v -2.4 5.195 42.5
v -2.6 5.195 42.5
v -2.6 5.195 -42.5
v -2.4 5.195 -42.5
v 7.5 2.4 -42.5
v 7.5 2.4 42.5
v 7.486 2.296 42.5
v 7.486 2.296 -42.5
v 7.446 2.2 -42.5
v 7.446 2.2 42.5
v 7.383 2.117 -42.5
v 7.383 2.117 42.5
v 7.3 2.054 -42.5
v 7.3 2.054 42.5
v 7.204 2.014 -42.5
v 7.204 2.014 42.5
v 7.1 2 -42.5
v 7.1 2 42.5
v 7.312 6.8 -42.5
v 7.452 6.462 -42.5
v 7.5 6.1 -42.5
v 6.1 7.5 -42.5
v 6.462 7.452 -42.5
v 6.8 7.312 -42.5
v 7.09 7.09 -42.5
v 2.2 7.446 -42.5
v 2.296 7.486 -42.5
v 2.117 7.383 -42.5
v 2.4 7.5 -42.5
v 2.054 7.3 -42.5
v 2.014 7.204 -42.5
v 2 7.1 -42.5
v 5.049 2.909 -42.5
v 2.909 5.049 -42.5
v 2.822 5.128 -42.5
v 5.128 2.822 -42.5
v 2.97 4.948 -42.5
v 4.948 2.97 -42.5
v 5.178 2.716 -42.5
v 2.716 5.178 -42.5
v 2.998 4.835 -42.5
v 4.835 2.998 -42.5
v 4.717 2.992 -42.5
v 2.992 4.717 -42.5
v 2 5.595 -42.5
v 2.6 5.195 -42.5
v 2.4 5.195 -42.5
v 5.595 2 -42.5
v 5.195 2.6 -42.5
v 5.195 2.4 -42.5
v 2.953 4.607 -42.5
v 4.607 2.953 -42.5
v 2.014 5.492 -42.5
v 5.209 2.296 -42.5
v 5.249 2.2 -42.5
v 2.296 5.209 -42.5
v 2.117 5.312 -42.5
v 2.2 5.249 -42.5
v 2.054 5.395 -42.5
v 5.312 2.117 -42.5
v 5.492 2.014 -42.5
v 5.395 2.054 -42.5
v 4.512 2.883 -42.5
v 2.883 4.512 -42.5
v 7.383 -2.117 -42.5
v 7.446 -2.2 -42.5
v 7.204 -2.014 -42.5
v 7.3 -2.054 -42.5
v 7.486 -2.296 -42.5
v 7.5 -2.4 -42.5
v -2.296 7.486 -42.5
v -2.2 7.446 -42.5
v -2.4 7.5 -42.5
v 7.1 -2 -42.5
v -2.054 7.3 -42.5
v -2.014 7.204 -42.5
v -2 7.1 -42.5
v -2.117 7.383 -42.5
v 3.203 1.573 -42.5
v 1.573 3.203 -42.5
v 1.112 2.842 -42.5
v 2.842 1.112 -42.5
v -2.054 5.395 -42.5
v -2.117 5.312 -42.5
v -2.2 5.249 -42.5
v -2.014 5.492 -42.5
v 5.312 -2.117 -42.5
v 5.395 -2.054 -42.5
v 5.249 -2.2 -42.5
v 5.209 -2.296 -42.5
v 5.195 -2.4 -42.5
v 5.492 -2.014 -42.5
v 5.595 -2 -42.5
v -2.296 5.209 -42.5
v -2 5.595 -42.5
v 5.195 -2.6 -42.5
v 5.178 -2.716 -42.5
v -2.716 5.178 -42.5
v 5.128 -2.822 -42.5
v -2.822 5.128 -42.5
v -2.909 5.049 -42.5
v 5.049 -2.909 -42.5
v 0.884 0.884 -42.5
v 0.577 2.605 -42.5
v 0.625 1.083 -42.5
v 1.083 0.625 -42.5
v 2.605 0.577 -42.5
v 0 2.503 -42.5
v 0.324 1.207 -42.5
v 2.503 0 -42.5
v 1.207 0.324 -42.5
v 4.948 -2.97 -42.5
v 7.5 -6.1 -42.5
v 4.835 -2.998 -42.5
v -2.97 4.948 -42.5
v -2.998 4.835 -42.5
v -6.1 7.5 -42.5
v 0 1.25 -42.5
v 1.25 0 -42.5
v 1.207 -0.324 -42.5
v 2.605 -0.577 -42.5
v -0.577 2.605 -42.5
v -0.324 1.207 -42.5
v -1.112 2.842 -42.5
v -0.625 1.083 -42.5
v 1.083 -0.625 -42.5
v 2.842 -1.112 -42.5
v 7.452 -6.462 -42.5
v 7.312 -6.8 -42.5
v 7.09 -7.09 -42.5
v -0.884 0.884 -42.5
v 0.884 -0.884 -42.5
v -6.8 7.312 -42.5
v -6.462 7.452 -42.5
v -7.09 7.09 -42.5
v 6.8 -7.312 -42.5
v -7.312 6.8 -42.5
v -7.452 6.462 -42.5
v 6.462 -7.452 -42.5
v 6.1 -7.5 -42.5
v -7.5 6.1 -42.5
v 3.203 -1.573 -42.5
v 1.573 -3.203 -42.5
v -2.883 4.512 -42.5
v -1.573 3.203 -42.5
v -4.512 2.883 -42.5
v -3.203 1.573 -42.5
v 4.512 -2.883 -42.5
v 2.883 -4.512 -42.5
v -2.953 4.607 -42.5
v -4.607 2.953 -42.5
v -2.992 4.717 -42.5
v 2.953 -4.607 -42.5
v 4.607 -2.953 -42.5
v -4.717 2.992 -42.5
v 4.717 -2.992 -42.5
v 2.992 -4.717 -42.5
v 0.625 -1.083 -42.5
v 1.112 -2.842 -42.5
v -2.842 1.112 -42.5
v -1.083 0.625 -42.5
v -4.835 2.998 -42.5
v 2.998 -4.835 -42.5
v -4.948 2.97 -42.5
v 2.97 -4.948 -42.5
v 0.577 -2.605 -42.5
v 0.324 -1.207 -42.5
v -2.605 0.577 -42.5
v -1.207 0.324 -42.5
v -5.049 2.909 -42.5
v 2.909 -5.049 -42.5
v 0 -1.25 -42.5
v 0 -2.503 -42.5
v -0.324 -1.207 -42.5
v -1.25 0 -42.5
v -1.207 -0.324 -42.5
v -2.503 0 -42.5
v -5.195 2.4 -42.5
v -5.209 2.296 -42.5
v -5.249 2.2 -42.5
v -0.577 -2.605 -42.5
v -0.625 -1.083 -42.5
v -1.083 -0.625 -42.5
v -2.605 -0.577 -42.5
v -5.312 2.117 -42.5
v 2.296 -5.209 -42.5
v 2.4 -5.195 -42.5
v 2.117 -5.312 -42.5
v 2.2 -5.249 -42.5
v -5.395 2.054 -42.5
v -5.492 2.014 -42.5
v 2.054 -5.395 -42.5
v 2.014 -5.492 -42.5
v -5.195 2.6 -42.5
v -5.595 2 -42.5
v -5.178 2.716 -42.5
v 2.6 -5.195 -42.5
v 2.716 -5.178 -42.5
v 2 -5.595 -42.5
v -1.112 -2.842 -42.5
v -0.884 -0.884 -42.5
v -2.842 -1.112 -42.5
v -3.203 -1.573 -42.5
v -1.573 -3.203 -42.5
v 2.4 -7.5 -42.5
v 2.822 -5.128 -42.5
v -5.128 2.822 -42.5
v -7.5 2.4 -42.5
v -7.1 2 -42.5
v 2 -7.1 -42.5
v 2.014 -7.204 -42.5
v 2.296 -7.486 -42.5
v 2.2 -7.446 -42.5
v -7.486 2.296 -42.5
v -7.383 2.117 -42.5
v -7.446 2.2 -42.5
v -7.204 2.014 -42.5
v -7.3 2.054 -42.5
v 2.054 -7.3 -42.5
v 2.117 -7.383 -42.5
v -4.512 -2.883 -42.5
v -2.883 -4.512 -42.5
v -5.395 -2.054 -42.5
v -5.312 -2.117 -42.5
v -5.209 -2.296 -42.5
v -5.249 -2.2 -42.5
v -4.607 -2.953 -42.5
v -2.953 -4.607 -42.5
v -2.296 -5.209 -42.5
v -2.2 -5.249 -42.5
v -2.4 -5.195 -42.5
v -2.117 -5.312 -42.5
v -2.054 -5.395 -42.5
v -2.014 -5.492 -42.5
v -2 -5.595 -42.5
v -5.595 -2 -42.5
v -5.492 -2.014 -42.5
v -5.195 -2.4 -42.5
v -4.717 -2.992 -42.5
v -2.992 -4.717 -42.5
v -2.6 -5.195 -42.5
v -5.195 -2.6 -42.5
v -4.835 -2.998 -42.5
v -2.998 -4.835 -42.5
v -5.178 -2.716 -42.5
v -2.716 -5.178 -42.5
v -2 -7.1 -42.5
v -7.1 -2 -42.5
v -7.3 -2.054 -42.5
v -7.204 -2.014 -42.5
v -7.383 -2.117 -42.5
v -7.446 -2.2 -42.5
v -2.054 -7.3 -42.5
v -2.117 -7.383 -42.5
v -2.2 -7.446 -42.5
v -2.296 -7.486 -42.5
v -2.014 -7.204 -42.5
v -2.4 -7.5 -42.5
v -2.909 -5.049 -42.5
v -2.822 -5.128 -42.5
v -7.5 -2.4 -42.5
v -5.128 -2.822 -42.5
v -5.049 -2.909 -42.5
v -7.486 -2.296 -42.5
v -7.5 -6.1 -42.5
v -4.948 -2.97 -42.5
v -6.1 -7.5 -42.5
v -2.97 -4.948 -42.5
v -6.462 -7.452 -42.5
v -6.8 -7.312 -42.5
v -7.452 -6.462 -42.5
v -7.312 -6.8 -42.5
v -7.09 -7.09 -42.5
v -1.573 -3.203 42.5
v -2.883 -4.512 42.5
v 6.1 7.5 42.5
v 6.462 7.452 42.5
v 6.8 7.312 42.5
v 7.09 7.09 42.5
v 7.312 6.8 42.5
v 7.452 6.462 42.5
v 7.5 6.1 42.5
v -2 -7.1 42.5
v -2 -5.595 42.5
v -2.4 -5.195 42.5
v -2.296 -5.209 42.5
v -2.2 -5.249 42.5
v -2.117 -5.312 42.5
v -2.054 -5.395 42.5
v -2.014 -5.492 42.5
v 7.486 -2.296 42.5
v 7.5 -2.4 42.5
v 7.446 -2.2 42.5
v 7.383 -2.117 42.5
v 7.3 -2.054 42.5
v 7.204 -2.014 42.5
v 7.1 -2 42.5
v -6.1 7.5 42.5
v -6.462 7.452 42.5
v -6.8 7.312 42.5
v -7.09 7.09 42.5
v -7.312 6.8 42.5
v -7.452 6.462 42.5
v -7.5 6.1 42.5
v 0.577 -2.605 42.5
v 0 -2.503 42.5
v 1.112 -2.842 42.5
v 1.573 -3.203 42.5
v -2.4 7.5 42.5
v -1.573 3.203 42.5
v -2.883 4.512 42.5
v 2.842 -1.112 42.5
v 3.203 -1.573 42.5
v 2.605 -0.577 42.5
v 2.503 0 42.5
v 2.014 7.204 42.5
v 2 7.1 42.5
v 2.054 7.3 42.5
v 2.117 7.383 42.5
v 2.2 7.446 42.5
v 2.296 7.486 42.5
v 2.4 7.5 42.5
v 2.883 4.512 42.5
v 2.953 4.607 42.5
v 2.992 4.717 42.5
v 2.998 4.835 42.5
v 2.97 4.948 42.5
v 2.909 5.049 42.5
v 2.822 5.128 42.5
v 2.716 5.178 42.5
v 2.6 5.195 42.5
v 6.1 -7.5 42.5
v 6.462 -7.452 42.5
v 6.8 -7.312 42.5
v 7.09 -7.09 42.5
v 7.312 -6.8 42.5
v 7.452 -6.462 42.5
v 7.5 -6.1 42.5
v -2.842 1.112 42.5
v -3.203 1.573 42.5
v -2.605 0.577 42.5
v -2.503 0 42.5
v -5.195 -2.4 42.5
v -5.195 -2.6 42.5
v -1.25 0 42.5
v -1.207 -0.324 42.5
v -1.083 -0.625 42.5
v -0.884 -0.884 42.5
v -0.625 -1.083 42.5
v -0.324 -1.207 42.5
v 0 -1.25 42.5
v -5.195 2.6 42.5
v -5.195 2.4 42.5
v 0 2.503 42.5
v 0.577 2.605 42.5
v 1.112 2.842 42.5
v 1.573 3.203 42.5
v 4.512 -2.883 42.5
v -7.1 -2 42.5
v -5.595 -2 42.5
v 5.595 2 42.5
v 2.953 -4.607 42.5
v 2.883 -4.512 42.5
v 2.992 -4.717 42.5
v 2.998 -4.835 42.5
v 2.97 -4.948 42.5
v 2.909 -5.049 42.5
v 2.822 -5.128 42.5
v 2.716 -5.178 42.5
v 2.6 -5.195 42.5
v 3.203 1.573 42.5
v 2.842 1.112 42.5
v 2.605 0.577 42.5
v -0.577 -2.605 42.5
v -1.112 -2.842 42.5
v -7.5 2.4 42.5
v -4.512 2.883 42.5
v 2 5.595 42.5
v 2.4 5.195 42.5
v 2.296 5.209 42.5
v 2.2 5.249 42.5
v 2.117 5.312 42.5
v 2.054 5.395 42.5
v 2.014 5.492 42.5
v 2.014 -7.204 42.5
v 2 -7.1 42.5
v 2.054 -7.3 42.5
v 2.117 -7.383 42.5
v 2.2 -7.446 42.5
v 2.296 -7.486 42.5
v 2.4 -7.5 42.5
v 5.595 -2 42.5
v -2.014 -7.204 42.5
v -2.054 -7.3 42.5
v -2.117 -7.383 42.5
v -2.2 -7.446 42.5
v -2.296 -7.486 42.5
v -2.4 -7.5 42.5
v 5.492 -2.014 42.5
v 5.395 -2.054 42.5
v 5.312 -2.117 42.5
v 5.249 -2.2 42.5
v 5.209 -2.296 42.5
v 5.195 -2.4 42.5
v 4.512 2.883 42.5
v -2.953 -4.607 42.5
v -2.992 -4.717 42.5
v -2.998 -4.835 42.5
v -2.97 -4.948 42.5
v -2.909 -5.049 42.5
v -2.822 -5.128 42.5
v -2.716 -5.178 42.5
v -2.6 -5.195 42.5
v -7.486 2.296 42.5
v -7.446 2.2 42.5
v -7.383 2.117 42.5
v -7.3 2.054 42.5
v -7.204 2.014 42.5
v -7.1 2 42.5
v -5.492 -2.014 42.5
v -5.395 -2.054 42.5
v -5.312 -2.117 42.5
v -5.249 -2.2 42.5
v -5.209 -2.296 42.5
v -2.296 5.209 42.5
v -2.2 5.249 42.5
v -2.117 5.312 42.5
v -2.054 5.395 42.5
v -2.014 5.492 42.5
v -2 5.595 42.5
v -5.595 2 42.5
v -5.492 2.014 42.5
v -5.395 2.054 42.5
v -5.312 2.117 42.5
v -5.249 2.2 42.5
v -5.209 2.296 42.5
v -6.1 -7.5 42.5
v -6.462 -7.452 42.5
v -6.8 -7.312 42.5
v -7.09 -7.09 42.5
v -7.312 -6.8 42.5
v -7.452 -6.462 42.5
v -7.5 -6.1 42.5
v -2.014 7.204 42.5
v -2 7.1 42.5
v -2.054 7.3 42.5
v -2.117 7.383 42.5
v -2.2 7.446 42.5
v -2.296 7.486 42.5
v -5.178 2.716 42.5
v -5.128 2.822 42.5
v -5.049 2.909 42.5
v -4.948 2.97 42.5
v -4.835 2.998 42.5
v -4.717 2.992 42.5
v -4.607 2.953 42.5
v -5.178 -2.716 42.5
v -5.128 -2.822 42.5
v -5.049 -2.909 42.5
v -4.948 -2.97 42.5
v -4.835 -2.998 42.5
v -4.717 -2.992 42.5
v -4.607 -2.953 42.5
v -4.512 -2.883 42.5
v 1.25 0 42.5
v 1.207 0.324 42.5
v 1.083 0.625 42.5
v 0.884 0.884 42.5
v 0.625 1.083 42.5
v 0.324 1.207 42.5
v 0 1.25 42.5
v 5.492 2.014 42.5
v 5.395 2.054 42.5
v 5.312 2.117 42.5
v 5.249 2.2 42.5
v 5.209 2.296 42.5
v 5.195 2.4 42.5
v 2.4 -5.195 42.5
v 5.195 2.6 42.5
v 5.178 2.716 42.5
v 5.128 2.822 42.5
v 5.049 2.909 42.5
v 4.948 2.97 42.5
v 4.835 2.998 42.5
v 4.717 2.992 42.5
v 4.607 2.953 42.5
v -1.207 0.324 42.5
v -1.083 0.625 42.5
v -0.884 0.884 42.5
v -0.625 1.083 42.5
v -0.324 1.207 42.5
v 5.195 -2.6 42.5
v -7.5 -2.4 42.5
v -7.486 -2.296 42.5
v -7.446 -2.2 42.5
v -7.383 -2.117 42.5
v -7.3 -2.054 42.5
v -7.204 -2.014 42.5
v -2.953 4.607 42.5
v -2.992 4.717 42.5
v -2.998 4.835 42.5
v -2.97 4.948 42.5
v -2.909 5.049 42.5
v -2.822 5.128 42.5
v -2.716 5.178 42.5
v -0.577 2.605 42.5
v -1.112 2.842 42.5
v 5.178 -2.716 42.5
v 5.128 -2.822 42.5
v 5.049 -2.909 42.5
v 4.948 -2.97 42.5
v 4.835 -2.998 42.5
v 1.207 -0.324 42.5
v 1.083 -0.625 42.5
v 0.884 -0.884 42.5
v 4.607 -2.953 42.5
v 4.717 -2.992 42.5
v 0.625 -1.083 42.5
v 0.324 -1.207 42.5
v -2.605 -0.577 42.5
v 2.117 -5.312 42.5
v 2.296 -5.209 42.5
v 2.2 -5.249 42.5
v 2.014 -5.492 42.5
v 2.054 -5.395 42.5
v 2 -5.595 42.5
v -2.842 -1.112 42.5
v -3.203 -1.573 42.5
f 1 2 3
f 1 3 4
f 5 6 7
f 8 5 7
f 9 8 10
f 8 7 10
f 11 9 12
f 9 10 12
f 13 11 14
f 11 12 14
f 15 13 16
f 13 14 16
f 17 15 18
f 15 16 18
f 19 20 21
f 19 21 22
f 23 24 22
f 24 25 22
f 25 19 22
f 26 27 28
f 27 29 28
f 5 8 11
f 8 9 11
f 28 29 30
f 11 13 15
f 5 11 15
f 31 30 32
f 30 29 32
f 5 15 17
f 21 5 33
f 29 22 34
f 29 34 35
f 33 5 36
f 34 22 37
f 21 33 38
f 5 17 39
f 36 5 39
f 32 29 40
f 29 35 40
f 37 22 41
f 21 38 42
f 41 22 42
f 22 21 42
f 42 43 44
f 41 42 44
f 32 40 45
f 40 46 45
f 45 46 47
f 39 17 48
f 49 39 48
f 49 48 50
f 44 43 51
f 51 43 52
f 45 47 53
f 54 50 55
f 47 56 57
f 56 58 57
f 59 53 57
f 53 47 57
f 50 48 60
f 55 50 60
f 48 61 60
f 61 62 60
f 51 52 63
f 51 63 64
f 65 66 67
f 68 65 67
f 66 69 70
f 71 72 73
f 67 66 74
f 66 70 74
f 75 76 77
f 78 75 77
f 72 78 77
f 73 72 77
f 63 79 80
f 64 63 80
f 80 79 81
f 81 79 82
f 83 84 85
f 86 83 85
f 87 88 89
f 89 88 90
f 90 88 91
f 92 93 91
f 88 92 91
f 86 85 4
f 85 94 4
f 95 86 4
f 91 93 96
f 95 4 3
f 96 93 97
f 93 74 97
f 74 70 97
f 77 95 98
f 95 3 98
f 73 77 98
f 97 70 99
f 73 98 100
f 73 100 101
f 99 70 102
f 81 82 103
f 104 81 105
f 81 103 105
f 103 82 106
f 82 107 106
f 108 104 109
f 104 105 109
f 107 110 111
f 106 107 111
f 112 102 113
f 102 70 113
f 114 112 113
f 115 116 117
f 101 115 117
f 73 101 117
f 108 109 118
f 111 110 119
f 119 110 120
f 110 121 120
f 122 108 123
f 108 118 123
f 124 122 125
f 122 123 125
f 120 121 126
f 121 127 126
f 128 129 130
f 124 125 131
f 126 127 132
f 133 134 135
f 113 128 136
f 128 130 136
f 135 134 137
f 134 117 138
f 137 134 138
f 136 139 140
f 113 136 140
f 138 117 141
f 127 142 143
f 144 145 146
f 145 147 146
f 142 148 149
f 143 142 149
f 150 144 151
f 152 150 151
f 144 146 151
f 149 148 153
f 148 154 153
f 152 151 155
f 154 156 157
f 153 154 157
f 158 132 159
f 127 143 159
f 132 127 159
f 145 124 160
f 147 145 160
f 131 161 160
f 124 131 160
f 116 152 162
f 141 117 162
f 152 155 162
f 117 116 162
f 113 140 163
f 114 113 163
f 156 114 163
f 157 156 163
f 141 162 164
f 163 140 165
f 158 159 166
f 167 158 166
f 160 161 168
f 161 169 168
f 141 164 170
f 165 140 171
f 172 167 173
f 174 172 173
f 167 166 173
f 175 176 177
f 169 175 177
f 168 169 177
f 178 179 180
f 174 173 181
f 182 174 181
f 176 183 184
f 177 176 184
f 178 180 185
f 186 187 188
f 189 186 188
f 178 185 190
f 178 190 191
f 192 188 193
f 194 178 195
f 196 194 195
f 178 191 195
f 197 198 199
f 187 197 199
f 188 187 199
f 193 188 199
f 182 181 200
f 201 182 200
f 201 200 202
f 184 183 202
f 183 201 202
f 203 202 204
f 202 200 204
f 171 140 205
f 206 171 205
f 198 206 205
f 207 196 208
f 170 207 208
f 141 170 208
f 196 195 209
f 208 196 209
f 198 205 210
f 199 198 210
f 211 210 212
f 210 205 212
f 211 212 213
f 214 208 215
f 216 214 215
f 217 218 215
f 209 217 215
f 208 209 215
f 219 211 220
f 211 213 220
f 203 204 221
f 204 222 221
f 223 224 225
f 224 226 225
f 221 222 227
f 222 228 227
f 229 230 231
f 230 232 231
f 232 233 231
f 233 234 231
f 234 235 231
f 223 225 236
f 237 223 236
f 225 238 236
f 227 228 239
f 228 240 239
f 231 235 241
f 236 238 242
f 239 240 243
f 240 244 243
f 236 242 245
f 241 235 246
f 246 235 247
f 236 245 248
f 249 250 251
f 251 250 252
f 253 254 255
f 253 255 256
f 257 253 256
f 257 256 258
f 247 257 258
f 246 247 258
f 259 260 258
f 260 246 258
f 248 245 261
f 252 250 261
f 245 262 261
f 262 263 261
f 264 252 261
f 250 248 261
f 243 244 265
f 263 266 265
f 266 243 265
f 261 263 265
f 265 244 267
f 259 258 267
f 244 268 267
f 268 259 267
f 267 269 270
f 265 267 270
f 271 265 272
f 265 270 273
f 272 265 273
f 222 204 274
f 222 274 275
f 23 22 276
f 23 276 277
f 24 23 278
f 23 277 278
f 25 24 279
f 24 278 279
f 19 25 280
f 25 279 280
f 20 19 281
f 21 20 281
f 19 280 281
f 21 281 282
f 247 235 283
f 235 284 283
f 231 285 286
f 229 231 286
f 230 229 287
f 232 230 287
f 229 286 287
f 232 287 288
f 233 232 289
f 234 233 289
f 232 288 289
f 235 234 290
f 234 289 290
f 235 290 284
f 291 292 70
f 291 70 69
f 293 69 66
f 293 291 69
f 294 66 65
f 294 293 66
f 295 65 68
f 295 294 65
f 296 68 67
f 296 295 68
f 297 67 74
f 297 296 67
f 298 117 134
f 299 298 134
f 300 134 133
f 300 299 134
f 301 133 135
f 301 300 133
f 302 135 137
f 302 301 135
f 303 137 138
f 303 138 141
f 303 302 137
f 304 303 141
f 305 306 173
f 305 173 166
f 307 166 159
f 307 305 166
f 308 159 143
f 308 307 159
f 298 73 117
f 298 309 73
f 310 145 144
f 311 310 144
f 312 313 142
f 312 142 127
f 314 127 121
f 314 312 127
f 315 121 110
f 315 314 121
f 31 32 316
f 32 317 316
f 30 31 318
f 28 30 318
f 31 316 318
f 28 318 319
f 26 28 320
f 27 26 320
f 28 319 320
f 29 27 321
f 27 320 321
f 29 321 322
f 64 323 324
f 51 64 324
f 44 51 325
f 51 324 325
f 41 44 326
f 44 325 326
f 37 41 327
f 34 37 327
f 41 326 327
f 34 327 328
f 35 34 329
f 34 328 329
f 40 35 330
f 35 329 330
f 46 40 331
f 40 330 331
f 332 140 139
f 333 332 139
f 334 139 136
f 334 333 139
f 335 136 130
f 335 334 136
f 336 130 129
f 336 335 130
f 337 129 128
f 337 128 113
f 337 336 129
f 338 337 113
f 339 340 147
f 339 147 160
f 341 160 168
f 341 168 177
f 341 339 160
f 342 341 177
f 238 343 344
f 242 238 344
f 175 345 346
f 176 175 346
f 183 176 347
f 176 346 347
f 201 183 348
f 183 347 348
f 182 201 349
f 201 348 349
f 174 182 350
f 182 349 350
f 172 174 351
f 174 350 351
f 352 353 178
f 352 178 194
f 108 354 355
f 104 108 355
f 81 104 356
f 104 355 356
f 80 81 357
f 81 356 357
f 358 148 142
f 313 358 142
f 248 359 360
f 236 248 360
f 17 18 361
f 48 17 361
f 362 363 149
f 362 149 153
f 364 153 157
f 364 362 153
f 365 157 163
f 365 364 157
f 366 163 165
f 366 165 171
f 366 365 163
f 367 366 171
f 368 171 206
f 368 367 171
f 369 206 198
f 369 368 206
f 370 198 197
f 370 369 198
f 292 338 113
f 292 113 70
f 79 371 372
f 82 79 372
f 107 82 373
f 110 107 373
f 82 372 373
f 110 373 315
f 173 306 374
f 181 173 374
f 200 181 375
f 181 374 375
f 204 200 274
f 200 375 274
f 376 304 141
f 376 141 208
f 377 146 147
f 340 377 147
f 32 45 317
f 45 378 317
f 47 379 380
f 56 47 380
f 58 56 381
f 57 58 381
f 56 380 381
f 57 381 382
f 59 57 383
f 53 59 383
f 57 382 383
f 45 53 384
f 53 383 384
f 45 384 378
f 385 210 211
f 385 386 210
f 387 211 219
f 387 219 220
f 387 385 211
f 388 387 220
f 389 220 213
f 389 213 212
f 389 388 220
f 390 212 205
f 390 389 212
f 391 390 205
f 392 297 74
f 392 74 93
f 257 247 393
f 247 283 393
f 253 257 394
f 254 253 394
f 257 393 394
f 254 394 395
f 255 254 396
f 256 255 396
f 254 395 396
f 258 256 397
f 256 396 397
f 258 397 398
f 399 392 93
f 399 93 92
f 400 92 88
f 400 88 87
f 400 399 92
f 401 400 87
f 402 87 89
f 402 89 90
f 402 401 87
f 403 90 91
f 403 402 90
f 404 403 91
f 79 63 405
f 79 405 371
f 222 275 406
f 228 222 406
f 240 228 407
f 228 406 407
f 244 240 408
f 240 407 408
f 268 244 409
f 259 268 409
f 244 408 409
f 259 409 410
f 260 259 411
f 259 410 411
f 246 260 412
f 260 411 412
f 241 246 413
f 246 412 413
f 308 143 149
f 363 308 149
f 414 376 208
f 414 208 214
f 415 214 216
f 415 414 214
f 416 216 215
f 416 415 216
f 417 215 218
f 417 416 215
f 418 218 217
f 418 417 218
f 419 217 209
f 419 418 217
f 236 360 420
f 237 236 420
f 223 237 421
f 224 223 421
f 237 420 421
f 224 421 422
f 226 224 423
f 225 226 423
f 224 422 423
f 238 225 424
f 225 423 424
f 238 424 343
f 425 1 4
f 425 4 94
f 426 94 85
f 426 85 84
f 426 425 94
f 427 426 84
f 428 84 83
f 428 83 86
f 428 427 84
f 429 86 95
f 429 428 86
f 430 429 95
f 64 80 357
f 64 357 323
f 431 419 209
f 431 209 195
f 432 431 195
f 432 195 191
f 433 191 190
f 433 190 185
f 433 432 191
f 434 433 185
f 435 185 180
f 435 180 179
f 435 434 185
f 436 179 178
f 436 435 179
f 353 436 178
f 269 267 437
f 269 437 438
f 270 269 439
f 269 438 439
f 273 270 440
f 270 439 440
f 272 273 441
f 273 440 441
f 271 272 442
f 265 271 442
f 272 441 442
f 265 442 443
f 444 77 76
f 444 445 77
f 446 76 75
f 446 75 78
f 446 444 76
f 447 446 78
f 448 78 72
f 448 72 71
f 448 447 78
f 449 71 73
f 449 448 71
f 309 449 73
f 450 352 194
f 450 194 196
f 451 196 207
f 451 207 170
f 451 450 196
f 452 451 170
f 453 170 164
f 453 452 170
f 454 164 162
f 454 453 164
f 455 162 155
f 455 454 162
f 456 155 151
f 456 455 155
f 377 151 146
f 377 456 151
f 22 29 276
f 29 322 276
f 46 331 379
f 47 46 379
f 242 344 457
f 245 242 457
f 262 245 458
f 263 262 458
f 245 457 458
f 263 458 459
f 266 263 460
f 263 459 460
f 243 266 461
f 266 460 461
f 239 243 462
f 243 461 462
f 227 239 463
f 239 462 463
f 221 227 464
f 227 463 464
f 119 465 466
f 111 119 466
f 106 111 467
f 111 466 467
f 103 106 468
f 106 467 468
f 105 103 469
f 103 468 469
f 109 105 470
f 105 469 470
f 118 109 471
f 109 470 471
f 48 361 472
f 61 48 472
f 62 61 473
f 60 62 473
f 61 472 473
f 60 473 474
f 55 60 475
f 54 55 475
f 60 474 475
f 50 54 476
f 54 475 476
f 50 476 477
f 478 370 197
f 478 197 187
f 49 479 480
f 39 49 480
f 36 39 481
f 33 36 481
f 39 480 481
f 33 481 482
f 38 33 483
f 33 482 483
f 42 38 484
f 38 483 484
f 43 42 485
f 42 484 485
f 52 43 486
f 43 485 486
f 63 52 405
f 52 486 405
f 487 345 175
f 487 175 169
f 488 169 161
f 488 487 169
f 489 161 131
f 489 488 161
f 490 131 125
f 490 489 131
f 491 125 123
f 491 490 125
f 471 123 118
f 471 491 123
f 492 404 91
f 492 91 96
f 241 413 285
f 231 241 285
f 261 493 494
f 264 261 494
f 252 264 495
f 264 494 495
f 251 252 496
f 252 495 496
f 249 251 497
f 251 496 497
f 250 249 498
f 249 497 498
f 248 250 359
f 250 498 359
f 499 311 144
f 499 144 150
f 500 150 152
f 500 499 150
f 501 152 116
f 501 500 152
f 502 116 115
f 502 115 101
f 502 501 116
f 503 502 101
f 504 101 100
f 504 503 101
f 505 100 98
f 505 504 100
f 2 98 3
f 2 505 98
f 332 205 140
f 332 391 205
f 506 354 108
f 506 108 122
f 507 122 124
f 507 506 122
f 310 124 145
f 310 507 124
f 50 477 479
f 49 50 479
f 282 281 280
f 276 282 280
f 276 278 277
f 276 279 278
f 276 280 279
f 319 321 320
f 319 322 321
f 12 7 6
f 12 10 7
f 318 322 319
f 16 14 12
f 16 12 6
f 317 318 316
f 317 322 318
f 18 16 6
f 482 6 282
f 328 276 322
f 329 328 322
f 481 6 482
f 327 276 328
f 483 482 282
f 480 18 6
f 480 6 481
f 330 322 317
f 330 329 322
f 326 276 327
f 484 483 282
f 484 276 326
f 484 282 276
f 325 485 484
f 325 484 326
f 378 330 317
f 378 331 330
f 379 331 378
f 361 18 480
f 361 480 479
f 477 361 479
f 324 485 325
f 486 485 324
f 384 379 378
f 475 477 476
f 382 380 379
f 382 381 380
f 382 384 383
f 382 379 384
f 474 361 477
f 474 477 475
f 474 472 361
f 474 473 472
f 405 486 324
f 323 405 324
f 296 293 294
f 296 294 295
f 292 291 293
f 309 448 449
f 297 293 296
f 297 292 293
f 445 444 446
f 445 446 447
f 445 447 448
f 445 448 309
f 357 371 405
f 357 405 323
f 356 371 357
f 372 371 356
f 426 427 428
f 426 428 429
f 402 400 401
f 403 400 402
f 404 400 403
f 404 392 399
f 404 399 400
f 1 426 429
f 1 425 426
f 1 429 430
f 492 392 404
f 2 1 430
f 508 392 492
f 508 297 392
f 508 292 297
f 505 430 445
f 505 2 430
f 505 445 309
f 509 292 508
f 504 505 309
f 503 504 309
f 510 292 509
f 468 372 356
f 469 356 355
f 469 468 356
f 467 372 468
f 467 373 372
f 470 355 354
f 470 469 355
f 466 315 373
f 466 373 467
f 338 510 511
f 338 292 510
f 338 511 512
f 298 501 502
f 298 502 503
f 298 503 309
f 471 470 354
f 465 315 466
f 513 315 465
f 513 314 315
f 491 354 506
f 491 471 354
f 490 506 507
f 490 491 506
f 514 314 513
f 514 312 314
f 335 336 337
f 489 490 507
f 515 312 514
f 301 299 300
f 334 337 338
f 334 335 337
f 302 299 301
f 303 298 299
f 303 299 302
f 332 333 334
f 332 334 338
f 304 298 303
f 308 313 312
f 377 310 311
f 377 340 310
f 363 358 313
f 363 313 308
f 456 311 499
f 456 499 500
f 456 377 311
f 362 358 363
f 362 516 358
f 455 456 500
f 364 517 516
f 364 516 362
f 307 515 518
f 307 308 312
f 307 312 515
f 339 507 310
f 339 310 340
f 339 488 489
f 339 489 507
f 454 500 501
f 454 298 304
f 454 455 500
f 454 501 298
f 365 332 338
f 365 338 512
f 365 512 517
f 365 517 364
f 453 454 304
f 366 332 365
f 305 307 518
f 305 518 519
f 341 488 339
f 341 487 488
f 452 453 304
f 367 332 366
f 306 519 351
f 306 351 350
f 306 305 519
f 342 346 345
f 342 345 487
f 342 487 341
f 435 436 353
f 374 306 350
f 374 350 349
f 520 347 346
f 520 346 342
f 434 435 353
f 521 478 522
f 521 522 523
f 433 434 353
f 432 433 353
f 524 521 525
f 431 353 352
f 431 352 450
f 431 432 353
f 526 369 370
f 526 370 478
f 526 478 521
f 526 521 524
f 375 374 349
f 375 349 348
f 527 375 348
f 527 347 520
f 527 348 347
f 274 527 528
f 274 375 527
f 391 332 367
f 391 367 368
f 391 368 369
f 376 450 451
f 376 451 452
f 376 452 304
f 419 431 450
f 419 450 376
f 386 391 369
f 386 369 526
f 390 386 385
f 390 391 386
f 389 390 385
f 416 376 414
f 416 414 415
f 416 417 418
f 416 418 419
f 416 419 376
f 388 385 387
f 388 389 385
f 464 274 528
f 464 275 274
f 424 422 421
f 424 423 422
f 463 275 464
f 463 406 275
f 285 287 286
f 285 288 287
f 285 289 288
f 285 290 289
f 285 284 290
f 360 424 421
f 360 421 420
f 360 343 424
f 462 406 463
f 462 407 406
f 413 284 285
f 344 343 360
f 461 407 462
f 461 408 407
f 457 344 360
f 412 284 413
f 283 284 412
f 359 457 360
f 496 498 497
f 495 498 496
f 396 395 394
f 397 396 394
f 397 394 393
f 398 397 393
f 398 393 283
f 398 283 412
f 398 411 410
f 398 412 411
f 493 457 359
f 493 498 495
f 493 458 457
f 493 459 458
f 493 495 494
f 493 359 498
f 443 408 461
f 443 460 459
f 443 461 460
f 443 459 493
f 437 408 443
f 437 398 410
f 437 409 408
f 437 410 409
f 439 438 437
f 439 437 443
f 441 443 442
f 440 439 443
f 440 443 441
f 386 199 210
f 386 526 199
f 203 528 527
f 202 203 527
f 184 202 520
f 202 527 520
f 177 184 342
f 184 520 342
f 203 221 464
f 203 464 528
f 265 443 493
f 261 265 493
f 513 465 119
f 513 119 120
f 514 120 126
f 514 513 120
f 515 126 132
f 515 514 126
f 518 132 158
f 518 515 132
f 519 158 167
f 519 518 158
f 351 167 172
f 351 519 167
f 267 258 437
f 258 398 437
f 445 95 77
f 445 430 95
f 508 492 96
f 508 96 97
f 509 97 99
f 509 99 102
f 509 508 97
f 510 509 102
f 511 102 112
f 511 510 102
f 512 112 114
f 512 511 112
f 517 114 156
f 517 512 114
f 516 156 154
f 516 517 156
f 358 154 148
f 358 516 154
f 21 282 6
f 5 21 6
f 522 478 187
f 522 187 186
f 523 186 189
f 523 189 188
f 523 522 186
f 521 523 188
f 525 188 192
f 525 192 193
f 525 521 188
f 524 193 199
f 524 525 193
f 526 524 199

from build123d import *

# Parameters (mm, degrees)
BOSS_EXTRUDE1_DEPTH = 42.5


with BuildPart() as part:
    # Sketch4 → Boss-Extrude1 (new body, symmetric)
    with BuildSketch(Plane.XY):
        with BuildLine():
            Line((2.4, -7.5), (6.1, -7.5))
            ThreePointArc((6.1, -7.5), (7.089949494, -7.089949494), (7.5, -6.1))
            Line((7.5, -6.1), (7.5, -2.4))
            ThreePointArc((7.5, -2.4), (7.382842712, -2.117157288), (7.1, -2))
            Line((7.1, -2), (5.595331881, -2))
            ThreePointArc((5.595331881, -2), (5.312489168, -2.117157288), (5.195331881, -2.4))
            Line((5.195331881, -2.4), (5.195331881, -2.6))
            ThreePointArc((5.195331881, -2.6), (4.948405254, -2.969551813), (4.512489168, -2.882842712))
            Line((4.512489168, -2.882842712), (3.202943725, -1.57329727))
            ThreePointArc((3.202943725, -1.57329727), (2.682689122, -0.794681232), (2.5, 0.123759005))
            Line((2.5, 0.123759005), (2.5, 0))
            Line((2.5, 0), (1.25, 0))
            ThreePointArc((1.25, 0), (0.883883476, -0.883883476), (0, -1.25))
            Line((0, -1.25), (0, -2.5))
            Line((0, -2.5), (-0.123759005, -2.5))
            ThreePointArc((-0.123759005, -2.5), (0.794681232, -2.682689122), (1.57329727, -3.202943725))
            Line((1.57329727, -3.202943725), (2.882842712, -4.512489168))
            ThreePointArc((2.882842712, -4.512489168), (2.969551813, -4.948405254), (2.6, -5.195331881))
            Line((2.6, -5.195331881), (2.4, -5.195331881))
            ThreePointArc((2.4, -5.195331881), (2.117157288, -5.312489168), (2, -5.595331881))
            Line((2, -5.595331881), (2, -7.1))
            ThreePointArc((2, -7.1), (2.117157288, -7.382842712), (2.4, -7.5))
        make_face()
    extrude(amount=BOSS_EXTRUDE1_DEPTH, both=True)

    # Mirror1: part across plane


with BuildPart() as part_1:
    add(part.part)
    add(part.part.mirror(Plane(origin=(0, 0, 0), x_dir=(0, 0, 1), z_dir=(1, 0, 0))))

    # Mirror2: part across plane


with BuildPart() as part_2:
    add(part_1.part)
    add(part_1.part.mirror(Plane.ZX))


solid = part_2.part
